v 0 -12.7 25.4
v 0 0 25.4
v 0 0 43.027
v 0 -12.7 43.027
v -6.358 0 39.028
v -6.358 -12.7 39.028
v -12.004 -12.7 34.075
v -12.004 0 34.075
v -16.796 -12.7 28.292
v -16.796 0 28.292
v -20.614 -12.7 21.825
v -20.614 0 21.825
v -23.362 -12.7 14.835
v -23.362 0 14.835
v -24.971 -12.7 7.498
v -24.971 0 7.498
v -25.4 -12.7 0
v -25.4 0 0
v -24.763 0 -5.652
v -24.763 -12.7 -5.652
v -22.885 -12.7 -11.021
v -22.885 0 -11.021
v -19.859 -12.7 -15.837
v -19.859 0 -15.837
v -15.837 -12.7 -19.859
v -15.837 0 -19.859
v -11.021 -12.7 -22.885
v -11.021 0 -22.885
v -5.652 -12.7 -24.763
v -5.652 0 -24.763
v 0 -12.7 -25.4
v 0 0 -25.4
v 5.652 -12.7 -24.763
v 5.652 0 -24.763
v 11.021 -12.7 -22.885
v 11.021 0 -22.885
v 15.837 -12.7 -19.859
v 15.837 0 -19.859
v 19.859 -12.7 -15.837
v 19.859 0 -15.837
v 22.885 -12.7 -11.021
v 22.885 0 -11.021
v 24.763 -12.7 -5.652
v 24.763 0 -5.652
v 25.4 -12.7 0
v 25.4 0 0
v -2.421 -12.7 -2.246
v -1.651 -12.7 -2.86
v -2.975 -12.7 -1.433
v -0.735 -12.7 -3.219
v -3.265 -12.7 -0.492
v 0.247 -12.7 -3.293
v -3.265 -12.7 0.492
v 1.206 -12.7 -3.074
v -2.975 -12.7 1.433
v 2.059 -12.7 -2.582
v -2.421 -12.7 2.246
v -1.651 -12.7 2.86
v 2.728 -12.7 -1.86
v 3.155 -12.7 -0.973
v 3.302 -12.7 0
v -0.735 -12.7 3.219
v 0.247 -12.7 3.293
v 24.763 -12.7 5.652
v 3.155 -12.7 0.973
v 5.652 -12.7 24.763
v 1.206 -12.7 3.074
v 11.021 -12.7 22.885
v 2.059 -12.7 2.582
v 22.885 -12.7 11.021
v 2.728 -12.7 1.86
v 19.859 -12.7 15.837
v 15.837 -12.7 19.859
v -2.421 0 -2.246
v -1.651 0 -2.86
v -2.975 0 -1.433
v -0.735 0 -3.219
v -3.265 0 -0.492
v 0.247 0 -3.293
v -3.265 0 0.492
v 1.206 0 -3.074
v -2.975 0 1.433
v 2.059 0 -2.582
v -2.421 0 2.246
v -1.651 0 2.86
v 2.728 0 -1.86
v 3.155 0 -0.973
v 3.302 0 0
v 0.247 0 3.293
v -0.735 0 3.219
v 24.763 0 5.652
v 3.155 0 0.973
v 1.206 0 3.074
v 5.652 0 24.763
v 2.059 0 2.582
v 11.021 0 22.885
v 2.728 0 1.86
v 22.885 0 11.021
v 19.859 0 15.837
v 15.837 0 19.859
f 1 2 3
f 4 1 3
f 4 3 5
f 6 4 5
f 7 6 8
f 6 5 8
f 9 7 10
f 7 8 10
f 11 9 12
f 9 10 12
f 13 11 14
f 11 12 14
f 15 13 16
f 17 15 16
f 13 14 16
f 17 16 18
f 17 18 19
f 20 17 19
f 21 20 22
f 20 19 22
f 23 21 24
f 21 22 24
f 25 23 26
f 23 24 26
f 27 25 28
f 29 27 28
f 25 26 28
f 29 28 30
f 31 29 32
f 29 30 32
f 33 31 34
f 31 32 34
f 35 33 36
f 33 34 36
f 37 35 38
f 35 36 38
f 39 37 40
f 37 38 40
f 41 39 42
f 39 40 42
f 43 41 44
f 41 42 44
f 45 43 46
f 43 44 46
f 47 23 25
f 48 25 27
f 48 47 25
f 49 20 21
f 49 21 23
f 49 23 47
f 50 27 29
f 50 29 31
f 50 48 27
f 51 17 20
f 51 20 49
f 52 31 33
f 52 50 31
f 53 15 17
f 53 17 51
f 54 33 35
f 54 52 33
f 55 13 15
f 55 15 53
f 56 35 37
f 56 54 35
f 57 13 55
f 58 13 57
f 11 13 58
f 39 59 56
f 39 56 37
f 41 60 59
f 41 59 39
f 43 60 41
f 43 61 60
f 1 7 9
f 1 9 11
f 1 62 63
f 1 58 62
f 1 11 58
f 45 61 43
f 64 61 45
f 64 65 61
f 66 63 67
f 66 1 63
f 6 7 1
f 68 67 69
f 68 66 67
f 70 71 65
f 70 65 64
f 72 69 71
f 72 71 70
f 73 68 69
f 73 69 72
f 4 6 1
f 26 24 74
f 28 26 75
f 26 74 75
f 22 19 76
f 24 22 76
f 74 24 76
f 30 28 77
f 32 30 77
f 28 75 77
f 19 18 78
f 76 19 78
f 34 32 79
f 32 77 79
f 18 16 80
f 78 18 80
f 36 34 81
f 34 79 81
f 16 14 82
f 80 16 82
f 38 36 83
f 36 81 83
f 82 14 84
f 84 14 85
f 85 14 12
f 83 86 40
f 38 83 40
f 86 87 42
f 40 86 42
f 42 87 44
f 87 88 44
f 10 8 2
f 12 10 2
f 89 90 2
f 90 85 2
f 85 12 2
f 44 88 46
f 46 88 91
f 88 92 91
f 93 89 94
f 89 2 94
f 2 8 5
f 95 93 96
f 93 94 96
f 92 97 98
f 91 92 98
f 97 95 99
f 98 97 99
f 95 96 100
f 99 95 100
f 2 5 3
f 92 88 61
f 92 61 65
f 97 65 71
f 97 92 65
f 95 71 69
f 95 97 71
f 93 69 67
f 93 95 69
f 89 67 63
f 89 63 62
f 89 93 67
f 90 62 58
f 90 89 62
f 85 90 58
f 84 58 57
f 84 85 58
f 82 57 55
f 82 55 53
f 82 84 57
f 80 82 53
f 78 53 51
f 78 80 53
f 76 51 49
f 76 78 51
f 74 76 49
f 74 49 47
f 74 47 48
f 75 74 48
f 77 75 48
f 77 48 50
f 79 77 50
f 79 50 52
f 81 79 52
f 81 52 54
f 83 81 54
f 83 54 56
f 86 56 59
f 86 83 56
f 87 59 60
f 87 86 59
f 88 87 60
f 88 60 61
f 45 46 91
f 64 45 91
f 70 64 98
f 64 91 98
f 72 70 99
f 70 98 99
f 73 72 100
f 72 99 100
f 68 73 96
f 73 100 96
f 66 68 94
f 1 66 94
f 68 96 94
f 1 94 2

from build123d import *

# Parameters (mm, degrees)
F0_R     = 3.302
F1_DEPTH = 12.7


with BuildPart() as f1:
    # F0 (on Front) → F1 (new body)
    with BuildSketch(Plane.XZ):
        with BuildLine():
            ThreePointArc((-25.4, 0), (0, -25.4), (25.4, 0))
            ThreePointArc((25.4, 0), (17.960512, 17.960512), (0, 25.4))
            ThreePointArc((0, 25.4), (-17.960512, 17.960512), (-25.4, 0))
        make_face()
        Circle(F0_R, mode=Mode.SUBTRACT)
        with BuildLine():
            ThreePointArc((-25.4, 0), (-17.960512, 17.960512), (0, 25.4))
            Line((0, 25.4), (0, 43.026961))
            ThreePointArc((0, 43.026961), (-18.83358, 25.134302), (-25.4, 0))
        make_face()
    extrude(amount=F1_DEPTH)


solid = f1.part
